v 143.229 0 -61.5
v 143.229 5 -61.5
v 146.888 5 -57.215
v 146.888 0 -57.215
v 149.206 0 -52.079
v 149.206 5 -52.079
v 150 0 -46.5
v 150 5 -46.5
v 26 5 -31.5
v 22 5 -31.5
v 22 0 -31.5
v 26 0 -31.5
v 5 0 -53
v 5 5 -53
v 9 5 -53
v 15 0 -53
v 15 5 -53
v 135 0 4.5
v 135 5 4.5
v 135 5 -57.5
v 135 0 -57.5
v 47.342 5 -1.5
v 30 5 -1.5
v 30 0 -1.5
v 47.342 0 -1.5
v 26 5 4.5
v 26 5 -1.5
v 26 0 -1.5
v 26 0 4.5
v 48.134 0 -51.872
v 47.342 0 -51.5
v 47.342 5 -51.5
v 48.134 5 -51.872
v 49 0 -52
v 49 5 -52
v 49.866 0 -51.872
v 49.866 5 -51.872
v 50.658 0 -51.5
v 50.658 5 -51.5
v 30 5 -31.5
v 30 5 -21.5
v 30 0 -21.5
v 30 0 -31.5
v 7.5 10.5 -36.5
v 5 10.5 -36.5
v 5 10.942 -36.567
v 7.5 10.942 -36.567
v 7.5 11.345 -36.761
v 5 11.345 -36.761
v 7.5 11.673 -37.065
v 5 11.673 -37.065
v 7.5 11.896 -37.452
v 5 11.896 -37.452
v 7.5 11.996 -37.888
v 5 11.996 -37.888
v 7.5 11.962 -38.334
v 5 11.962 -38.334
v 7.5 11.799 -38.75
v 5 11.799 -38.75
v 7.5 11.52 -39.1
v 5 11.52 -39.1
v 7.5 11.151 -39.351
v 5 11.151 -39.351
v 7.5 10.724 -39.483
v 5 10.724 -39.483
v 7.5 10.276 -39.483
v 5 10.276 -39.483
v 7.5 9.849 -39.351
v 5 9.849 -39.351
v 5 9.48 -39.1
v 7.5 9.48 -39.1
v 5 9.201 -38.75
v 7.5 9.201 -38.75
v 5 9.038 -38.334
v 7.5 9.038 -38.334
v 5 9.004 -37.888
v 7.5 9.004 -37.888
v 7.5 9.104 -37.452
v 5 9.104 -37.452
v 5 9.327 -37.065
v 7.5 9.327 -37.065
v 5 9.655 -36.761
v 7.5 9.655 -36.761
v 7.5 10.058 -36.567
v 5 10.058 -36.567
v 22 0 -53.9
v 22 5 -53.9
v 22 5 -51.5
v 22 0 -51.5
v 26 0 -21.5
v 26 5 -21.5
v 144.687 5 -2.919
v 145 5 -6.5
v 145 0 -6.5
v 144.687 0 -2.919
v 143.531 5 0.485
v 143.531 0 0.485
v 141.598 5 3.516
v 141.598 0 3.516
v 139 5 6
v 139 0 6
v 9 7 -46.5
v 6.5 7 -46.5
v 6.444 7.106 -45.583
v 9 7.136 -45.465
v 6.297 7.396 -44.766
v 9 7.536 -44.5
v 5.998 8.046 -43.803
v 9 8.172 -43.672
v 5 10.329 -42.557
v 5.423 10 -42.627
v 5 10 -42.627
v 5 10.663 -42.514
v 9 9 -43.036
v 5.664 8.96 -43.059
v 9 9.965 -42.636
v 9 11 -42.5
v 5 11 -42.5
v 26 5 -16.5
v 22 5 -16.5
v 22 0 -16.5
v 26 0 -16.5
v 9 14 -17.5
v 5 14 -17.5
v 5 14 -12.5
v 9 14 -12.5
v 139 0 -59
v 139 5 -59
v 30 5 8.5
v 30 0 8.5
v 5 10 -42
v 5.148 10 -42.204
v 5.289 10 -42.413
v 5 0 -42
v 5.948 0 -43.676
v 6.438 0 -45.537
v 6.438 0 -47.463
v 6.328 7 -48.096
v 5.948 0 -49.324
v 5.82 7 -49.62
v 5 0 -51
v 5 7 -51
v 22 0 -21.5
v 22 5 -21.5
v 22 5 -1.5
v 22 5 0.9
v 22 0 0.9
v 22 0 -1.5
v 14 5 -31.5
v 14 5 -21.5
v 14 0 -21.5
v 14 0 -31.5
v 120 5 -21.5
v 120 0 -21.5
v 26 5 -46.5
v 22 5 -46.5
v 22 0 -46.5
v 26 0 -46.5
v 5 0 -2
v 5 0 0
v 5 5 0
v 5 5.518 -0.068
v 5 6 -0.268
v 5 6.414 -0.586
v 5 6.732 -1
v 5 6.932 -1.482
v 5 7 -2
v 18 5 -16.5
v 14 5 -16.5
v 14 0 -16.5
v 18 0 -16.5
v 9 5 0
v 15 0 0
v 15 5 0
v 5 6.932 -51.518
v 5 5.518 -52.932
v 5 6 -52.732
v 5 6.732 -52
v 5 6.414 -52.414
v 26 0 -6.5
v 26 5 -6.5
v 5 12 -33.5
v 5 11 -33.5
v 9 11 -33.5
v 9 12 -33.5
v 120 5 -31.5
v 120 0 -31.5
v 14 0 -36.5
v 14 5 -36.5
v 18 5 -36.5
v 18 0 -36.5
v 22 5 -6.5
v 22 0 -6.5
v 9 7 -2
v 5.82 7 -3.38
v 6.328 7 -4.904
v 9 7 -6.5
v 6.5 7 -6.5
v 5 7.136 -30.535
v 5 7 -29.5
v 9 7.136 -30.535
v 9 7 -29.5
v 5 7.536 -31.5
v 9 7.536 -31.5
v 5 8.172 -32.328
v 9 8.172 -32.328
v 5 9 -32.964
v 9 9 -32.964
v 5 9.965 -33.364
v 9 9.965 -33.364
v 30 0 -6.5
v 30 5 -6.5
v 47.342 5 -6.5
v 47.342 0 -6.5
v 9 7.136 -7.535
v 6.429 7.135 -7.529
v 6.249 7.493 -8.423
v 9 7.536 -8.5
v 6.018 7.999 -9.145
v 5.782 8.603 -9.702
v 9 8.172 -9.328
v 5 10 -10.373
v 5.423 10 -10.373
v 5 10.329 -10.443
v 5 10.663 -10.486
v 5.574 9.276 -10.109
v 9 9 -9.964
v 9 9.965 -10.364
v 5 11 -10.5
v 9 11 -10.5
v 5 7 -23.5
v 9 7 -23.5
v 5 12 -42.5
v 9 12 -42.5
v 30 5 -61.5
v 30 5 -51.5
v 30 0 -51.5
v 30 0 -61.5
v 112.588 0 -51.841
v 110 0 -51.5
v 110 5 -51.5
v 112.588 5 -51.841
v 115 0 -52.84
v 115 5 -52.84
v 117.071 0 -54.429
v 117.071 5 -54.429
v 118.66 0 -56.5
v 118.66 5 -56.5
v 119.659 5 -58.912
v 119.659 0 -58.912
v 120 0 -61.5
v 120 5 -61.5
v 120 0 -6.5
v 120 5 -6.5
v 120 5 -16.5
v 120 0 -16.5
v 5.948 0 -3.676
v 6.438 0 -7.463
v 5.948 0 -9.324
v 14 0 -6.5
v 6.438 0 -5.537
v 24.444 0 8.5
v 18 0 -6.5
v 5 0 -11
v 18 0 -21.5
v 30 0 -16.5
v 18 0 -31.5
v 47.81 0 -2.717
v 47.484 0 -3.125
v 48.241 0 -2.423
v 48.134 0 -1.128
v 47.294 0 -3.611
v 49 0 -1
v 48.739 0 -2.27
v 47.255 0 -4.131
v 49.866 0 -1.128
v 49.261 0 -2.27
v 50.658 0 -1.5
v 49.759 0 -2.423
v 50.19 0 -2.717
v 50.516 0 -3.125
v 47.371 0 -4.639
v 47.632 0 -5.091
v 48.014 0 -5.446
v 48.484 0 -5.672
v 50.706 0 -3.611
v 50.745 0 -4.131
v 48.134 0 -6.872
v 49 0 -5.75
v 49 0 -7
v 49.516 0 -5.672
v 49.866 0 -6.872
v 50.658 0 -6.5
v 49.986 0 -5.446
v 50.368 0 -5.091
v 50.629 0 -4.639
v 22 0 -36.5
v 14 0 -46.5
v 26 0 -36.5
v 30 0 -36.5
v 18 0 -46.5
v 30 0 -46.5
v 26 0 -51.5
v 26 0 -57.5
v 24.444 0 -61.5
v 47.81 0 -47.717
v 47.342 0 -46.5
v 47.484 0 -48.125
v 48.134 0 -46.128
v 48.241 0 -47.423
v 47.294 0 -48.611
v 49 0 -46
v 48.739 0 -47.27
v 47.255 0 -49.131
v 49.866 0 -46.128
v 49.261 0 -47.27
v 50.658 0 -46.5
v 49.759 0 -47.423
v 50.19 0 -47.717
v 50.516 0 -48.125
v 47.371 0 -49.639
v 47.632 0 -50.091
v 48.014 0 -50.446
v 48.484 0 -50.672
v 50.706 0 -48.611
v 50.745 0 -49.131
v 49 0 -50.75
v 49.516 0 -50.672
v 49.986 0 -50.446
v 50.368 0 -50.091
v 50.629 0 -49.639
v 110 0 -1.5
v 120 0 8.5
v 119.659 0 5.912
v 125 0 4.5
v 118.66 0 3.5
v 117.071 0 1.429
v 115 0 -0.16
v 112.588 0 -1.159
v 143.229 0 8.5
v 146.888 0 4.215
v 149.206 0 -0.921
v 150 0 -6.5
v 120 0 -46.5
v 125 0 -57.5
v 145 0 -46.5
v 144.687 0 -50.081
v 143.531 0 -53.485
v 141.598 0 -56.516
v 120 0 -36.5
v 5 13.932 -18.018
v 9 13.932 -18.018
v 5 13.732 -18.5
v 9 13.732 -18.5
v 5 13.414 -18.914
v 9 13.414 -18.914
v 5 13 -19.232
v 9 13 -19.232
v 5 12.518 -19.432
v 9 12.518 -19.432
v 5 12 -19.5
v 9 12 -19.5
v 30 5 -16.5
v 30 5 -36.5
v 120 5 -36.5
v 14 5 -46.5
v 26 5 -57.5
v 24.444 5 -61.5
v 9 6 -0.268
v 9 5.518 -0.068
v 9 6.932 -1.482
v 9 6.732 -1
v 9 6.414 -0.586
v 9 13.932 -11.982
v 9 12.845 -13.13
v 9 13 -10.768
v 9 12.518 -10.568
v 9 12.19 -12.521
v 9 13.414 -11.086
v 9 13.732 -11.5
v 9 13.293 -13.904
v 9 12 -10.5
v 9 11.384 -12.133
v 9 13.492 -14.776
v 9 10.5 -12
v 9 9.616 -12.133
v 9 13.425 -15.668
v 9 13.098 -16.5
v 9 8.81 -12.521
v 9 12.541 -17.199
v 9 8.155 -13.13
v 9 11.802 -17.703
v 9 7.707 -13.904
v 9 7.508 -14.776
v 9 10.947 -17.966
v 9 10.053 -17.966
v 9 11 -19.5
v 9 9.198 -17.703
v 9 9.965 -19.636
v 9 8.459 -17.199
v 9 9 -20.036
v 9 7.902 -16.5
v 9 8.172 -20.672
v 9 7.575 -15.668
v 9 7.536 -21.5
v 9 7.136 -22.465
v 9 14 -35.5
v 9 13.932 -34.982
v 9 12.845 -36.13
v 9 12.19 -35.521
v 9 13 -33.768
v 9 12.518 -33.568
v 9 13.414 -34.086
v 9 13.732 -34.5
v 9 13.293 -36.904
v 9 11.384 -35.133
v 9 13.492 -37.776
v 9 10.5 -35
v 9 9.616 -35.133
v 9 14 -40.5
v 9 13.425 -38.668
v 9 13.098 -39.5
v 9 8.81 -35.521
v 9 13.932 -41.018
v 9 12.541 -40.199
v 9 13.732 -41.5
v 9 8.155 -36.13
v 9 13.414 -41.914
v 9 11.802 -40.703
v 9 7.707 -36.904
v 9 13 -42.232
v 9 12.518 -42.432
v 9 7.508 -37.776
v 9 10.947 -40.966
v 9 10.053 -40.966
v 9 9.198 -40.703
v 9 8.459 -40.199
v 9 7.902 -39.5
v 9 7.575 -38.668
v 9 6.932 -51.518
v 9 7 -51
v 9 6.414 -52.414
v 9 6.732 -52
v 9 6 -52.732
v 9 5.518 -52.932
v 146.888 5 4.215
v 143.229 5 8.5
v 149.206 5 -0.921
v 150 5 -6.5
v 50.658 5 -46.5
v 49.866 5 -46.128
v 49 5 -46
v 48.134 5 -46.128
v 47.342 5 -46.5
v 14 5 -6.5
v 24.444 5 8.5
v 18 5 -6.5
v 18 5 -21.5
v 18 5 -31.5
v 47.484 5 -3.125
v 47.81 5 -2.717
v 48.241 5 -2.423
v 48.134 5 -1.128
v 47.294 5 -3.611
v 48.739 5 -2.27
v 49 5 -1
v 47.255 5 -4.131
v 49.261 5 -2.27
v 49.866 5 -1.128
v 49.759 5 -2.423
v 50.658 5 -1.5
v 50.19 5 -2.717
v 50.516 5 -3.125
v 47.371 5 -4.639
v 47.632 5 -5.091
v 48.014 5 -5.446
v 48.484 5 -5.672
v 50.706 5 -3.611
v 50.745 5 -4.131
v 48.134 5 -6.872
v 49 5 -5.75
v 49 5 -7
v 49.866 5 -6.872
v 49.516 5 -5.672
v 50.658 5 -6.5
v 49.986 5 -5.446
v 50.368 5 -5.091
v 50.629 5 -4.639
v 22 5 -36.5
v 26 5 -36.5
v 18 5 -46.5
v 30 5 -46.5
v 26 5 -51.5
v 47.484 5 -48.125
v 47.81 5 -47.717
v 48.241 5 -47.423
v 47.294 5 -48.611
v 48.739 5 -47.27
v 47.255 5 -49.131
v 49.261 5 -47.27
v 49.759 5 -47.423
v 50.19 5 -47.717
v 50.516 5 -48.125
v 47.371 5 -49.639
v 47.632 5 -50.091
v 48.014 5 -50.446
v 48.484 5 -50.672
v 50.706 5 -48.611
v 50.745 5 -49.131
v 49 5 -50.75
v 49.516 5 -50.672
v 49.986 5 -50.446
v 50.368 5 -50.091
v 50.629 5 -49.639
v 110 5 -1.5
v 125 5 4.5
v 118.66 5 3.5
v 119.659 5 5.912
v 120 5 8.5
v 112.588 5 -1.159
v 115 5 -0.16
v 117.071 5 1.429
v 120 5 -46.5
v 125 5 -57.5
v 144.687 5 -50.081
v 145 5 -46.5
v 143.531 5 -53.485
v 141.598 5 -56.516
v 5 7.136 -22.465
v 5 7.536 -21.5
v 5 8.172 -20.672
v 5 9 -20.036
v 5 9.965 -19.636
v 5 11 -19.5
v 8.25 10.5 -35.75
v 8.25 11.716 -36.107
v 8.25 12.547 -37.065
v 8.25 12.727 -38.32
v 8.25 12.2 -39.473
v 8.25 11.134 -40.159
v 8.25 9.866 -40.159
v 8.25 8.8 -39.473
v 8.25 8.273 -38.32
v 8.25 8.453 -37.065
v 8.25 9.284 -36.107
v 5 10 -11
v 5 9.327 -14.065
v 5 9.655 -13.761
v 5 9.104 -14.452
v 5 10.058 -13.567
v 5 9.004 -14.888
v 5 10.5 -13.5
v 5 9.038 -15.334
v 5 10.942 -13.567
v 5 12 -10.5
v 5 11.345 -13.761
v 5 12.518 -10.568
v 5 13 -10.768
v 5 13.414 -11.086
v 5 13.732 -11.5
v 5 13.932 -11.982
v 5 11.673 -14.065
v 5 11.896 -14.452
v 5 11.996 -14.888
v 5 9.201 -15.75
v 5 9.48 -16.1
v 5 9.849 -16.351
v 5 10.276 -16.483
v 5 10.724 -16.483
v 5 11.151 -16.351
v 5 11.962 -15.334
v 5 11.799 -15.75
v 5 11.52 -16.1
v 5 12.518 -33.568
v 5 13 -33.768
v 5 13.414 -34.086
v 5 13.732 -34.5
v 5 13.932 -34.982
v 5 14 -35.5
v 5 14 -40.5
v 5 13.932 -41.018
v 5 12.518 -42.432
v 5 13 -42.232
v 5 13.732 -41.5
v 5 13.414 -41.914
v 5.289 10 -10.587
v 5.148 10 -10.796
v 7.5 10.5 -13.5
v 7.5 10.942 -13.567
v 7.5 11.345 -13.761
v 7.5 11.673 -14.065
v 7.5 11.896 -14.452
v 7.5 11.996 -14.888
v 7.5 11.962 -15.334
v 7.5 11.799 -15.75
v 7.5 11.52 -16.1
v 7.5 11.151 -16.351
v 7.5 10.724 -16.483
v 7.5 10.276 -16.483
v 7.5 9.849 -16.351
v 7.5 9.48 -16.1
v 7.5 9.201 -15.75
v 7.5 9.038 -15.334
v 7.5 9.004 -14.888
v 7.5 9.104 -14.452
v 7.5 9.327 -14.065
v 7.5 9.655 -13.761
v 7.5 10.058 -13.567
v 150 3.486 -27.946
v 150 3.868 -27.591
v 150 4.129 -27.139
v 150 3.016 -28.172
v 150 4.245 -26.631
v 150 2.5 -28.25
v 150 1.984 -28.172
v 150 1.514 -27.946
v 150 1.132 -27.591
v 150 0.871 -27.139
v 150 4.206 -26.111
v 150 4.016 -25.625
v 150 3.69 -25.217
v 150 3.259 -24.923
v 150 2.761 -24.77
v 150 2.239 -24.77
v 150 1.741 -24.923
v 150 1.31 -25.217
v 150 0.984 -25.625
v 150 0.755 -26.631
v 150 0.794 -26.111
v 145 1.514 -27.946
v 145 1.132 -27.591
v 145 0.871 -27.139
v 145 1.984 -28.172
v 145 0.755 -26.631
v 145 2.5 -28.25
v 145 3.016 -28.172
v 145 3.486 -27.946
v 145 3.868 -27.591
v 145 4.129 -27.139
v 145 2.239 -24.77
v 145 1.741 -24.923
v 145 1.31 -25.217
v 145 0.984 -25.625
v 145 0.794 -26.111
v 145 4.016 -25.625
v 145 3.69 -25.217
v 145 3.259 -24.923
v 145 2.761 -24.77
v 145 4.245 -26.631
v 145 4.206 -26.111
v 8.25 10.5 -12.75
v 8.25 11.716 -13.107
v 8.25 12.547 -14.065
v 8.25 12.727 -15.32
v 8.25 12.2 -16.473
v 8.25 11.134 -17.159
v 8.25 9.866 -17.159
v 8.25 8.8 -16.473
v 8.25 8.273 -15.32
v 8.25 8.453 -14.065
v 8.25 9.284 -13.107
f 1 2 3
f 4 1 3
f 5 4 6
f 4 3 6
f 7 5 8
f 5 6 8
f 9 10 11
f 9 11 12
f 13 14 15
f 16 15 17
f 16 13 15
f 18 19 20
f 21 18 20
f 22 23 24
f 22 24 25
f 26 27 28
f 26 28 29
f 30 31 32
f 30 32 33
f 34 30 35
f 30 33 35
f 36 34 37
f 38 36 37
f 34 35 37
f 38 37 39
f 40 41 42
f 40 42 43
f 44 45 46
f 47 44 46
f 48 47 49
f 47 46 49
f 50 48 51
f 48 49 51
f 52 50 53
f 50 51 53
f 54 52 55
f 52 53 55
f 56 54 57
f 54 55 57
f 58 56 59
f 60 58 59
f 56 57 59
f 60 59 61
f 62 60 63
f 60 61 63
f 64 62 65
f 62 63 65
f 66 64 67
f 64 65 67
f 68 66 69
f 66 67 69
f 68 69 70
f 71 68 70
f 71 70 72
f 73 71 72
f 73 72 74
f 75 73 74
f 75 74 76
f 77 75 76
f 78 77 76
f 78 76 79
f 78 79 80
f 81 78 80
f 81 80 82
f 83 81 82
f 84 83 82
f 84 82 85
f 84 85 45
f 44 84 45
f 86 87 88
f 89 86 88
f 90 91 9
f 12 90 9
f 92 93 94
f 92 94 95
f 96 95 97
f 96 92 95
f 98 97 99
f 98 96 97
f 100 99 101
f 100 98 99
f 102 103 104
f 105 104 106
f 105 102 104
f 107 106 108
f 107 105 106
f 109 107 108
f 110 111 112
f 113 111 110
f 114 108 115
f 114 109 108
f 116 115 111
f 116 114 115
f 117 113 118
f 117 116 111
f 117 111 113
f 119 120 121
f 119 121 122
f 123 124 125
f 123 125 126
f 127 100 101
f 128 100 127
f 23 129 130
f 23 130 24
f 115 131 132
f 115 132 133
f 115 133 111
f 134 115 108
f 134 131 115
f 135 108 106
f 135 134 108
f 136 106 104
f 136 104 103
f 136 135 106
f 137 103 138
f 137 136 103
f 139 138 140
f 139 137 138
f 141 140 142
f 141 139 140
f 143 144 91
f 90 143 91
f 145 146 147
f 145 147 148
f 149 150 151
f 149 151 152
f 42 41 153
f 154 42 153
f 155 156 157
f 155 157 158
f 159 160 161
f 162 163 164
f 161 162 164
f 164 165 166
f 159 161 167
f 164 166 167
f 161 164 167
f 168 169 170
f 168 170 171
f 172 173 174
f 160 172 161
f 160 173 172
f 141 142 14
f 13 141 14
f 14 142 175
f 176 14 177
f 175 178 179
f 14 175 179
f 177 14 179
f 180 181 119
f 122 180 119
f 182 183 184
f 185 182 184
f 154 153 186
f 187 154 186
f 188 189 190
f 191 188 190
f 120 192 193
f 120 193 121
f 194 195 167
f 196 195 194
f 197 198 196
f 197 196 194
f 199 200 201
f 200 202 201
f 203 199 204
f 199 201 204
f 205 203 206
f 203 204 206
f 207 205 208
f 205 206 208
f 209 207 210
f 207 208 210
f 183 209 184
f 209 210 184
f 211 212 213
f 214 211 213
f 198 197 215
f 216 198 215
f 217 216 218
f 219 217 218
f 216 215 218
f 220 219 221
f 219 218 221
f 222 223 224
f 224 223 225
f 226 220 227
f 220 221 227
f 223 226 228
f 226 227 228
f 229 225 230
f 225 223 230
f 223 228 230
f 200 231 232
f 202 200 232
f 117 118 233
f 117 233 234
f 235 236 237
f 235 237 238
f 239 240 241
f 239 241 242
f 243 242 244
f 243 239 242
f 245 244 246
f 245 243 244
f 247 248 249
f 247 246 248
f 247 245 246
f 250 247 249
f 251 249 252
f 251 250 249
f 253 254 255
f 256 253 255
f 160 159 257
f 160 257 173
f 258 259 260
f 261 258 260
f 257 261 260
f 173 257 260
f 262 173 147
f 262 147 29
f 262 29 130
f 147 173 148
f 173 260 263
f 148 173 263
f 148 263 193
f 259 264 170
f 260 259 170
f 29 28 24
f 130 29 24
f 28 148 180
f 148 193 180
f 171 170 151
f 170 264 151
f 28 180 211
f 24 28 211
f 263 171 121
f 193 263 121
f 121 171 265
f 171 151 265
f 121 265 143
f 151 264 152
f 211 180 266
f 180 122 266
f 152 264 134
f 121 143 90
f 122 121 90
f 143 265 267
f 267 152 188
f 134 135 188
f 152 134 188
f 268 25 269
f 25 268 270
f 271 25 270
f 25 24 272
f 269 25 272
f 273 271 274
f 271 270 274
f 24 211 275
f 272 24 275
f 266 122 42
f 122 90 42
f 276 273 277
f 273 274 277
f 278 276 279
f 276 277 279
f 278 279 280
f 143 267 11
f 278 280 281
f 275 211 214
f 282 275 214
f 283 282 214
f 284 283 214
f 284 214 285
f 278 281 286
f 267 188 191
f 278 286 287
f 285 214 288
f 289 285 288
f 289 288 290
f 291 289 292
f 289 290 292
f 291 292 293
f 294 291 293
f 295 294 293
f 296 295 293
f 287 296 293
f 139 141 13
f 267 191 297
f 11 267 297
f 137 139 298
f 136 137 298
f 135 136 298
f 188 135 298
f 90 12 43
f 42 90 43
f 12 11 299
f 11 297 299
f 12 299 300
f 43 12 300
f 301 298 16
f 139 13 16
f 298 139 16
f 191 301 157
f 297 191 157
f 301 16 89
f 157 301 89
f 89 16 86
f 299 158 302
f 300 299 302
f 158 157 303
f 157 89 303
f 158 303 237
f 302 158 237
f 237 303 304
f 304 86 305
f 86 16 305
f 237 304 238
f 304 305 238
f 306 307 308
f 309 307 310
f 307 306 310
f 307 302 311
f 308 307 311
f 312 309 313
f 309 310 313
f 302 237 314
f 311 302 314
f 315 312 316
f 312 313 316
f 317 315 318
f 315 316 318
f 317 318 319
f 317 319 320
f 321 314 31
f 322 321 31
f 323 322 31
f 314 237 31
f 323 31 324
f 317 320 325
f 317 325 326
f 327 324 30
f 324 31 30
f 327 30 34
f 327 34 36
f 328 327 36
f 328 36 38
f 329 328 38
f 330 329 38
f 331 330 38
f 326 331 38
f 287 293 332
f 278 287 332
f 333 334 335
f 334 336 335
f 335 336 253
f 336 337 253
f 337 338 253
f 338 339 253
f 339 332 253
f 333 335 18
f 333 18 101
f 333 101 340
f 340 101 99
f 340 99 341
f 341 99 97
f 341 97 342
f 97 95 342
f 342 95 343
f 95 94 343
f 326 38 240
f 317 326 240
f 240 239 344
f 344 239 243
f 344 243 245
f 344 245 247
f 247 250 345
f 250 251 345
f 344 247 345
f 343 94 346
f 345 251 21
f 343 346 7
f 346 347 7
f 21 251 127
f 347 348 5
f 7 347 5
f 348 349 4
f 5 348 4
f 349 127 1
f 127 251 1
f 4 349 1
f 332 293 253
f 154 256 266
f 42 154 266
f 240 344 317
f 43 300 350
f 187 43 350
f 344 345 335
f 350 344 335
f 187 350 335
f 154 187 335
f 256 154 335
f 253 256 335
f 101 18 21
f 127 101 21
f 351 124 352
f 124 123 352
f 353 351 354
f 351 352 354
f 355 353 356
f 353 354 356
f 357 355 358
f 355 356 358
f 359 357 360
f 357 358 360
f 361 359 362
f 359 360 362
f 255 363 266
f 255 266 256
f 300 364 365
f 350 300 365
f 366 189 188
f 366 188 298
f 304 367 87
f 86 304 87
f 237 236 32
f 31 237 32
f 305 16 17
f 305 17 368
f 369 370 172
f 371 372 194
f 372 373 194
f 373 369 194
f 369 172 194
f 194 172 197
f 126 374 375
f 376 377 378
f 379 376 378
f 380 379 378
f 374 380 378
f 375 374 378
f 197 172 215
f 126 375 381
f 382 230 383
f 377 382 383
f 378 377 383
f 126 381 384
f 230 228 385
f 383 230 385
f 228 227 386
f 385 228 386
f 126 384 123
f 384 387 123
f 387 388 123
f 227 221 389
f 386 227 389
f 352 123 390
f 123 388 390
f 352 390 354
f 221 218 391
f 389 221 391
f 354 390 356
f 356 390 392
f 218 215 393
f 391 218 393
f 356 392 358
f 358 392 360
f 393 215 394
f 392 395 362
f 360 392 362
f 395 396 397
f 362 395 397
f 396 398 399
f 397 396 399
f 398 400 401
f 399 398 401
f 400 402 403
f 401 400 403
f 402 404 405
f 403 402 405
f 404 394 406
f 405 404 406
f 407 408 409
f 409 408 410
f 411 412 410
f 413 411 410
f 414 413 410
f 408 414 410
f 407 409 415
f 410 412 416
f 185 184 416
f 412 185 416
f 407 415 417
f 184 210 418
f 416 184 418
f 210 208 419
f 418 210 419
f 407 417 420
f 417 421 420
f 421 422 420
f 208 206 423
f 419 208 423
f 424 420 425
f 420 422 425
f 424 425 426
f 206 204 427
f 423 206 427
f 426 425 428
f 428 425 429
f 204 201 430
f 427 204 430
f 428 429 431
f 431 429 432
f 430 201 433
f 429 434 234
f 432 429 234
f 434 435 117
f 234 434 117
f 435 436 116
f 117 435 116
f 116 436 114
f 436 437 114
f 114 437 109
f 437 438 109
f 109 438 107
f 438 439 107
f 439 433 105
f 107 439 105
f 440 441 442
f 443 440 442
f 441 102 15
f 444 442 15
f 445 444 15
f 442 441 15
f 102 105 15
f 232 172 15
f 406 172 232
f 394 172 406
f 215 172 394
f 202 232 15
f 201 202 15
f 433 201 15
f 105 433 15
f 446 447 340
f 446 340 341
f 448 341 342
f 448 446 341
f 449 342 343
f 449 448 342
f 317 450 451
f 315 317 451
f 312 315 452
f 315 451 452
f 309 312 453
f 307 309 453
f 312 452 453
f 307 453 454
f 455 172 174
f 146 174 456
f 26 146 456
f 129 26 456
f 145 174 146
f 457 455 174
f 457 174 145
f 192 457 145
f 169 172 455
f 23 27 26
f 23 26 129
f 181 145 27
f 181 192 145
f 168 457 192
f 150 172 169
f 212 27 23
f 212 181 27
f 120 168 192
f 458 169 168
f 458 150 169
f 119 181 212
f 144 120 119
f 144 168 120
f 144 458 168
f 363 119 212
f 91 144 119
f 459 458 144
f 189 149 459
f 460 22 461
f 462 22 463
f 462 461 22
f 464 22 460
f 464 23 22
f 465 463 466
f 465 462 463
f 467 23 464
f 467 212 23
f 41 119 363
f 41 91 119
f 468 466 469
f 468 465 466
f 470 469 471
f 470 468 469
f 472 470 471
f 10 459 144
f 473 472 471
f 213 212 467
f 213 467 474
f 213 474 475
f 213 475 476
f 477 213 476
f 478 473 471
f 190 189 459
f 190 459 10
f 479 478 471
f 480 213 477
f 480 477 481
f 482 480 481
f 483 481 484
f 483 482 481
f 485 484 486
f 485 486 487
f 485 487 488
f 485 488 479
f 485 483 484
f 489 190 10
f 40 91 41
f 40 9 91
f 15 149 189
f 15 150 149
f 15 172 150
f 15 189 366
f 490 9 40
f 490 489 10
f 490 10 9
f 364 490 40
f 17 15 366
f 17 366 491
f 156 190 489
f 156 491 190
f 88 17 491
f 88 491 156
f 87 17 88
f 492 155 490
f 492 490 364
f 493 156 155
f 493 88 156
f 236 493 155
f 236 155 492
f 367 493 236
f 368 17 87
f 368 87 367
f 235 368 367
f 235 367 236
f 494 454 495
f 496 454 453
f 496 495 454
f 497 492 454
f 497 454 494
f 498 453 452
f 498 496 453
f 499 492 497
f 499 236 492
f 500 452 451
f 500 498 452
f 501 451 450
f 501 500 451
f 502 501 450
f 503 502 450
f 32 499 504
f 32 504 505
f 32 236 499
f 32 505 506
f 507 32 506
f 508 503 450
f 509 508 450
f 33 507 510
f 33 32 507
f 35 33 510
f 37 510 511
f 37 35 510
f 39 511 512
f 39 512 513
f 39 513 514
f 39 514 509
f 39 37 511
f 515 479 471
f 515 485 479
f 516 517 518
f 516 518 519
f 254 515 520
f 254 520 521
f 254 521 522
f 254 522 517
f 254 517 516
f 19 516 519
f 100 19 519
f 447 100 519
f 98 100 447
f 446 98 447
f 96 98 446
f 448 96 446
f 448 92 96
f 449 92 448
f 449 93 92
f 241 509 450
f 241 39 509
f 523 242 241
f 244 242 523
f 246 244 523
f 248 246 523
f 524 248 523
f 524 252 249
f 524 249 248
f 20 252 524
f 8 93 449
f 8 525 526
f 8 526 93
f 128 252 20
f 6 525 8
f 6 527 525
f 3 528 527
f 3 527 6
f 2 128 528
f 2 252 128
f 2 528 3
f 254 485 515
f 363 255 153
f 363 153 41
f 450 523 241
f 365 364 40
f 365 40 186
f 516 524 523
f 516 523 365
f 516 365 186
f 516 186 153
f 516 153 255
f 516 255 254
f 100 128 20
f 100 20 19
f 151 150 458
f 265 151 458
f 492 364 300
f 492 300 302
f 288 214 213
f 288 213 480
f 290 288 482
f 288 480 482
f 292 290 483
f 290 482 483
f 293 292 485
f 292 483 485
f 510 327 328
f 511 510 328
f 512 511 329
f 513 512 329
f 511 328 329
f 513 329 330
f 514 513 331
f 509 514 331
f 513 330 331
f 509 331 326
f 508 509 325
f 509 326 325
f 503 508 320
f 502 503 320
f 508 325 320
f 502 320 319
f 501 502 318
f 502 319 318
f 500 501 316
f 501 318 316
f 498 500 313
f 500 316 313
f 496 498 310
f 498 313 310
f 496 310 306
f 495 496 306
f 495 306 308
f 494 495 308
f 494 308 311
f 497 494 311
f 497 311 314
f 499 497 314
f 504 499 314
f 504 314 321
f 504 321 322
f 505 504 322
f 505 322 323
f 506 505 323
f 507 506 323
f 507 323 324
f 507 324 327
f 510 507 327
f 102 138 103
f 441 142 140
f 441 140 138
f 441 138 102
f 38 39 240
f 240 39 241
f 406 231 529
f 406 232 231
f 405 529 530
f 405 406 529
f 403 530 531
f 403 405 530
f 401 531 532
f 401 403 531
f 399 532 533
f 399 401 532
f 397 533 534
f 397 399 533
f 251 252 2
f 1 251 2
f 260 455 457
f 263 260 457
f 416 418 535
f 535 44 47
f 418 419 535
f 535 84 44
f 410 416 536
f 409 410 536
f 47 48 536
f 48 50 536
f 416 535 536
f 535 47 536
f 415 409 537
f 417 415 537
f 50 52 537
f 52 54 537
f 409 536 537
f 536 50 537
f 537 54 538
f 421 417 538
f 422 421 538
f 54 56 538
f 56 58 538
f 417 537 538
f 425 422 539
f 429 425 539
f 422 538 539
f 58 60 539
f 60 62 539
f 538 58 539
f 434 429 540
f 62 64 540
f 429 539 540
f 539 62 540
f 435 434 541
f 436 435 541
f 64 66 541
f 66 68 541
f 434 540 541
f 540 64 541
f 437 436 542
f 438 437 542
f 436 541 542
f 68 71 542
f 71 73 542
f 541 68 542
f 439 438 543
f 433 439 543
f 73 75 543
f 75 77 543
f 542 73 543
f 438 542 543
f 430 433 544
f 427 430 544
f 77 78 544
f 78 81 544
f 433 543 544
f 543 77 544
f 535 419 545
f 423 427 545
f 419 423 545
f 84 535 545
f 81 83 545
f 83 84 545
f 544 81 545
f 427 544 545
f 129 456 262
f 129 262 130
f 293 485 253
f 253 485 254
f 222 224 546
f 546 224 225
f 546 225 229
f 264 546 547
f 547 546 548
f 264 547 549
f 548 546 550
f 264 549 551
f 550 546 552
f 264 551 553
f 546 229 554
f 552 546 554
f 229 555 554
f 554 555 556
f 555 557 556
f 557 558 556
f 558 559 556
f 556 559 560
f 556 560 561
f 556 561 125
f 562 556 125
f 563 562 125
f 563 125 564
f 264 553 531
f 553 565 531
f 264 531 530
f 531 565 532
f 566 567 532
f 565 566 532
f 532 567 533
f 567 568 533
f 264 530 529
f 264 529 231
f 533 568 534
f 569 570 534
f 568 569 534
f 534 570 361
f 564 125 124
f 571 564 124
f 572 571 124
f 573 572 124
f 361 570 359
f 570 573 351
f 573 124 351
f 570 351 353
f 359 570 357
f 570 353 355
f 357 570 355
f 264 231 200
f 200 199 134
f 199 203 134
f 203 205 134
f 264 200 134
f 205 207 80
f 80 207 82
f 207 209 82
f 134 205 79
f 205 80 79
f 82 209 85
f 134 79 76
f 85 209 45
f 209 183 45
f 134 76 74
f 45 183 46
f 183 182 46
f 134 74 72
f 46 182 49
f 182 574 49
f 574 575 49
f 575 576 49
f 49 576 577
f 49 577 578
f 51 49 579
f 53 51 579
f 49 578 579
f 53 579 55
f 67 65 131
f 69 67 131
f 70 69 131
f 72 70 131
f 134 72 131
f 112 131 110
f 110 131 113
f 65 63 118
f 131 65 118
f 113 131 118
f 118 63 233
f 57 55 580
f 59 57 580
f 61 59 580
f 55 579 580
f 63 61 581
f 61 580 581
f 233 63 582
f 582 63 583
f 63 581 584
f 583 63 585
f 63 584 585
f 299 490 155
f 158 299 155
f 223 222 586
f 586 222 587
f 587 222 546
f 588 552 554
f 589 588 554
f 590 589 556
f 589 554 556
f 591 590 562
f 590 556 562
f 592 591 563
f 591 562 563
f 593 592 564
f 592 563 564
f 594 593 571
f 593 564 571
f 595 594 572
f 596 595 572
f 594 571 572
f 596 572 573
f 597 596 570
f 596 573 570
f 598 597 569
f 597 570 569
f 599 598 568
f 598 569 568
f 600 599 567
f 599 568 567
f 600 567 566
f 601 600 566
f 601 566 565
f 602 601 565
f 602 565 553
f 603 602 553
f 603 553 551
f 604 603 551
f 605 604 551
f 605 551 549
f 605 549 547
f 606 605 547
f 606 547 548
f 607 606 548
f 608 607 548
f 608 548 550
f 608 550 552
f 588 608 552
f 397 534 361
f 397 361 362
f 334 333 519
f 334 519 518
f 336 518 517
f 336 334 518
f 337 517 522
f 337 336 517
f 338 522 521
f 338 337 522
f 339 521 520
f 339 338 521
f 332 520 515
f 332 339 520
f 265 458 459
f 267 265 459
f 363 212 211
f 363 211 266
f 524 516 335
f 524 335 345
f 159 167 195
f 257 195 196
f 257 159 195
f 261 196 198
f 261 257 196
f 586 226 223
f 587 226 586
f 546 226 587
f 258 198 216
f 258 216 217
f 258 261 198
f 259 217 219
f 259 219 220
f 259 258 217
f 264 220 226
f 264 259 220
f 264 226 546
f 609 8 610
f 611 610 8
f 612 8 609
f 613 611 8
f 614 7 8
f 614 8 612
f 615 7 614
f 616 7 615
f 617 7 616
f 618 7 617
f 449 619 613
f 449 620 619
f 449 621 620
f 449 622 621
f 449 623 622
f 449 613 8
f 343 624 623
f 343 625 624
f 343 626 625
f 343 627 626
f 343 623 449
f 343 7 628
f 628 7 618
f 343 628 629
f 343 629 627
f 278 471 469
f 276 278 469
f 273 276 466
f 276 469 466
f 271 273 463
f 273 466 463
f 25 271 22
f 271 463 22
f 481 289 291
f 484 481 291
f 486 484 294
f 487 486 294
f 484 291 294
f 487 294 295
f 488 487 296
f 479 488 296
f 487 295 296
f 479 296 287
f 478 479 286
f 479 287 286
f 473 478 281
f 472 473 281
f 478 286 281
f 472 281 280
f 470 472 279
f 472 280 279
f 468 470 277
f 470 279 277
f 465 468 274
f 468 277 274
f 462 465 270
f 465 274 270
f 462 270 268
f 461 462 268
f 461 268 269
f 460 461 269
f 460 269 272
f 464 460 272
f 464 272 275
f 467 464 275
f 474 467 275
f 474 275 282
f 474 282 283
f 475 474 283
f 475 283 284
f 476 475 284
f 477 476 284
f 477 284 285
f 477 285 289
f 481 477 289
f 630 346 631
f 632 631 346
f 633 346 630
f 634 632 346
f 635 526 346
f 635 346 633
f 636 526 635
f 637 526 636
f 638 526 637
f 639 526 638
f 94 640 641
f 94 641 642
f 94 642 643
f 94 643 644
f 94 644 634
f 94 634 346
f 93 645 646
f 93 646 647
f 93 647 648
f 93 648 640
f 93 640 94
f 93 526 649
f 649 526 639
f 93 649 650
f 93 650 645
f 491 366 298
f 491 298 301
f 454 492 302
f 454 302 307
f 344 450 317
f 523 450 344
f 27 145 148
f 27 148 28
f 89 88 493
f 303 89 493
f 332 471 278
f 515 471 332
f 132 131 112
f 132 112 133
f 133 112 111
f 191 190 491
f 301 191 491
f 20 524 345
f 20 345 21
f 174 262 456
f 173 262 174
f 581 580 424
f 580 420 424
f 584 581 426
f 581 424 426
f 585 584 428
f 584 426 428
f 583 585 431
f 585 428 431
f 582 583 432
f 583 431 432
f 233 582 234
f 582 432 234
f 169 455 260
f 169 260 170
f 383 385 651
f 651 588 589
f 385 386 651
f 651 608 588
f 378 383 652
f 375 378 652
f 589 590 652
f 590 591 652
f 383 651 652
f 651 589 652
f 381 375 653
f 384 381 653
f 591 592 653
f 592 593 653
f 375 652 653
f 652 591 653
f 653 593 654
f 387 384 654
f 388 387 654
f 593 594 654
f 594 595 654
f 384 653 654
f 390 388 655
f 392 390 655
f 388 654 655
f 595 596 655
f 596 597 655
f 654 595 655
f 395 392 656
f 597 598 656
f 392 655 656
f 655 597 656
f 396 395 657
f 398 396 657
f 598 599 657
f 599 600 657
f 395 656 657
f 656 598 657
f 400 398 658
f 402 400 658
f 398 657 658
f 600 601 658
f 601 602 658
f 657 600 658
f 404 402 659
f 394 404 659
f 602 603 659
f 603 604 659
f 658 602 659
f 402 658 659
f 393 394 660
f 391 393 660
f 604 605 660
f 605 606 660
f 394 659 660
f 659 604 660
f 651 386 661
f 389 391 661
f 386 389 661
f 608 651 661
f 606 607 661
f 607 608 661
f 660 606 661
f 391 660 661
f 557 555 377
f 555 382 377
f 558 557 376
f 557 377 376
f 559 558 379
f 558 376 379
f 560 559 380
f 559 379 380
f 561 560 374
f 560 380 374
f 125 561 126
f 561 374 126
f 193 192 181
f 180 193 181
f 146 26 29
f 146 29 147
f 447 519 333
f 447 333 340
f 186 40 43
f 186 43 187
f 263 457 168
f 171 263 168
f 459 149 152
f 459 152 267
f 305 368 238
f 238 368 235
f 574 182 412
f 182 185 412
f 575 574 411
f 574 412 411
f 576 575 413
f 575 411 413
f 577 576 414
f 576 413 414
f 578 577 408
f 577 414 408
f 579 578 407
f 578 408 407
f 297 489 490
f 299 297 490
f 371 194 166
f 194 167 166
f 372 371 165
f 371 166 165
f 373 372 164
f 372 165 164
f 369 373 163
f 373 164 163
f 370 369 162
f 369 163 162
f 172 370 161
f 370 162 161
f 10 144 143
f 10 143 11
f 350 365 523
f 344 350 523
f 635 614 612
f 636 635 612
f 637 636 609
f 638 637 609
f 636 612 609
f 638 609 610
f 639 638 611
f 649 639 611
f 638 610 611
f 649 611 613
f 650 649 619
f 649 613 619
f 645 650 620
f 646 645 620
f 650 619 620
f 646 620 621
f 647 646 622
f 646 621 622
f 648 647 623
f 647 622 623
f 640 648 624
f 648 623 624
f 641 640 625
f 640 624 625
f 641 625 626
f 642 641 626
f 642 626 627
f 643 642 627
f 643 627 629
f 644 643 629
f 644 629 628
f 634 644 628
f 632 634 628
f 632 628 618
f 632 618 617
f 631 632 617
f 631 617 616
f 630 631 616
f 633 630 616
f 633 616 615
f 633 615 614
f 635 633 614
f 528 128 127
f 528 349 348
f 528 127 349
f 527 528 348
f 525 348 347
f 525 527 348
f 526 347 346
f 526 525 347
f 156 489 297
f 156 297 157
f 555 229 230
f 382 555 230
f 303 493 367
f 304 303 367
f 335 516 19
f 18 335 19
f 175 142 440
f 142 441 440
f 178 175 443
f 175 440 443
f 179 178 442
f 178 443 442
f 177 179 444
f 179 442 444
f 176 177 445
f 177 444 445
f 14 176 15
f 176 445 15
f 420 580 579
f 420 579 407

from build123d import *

# Parameters (mm, degrees)
Y_KSEKLIK_EKSTR_ZYON1_DEPTH = 7
IZIM2_R                     = 1.5
KES_EKSTR_ZYON1_DEPTH       = 7
PAH1_SIZE                   = 2.5
IZIM3_R                     = 2
KES_EKSTR_ZYON2_DEPTH       = 10
KES_EKSTR_ZYON3_START       = -10
IZIM4_R                     = 2
KES_EKSTR_ZYON3_DEPTH       = 10
RADYUS1_R                   = 20
IZIM5_W                     = 90
IZIM5_H                     = 10
IZIM5_W_2                   = 10
IZIM5_H_2                   = 70
KES_EKSTR_ZYON4_DEPTH       = 10
RADYUS2_R                   = 4
KES_EKSTR_ZYON5_DEPTH       = 10
IZIM8_W                     = 5
IZIM8_H                     = 53
KES_EKSTR_ZYON6_DEPTH       = 10
IZIM9_W                     = 8.724341423
IZIM9_H                     = 2.178581573
IZIM9_W_2                   = 9.164333206
Y_KSEKLIK_EKSTR_ZYON2_DEPTH = 10
IZIM10_W                    = 140
IZIM10_H                    = 10
KES_EKSTR_ZYON7_DEPTH       = 10
IZIM11_W                    = 10
IZIM11_H                    = 4
Y_KSEKLIK_EKSTR_ZYON3_DEPTH = 7
RADYUS3_R                   = 10
IZIM12_W                    = 4
IZIM12_H                    = 9
Y_KSEKLIK_EKSTR_ZYON4_DEPTH = 7
RADYUS4_R                   = 4
IZIM13_R                    = 1.5
KES_EKSTR_ZYON8_DEPTH       = 7
PAH2_SIZE                   = 1.5
RADYUS5_R                   = 2
IZIM14_W                    = 144.535934645
IZIM14_H                    = 70
KES_EKSTR_ZYON9_DEPTH       = 2
RADYUS6_R                   = 2
KES_EKSTR_ZYON10_DEPTH      = 5
KES_EKSTR_ZYON10_DEPTH_BACK = 5
IZIM15_R                    = 7.5
IZIM16_R                    = 1.75
KES_EKSTR_ZYON11_DEPTH      = 7
IZIM17_R                    = 1.75
KES_EKSTR_ZYON12_DEPTH      = 10
Y_KSEKLIK_EKSTR_ZYON5_START = -5
IZIM18_R                    = 3
IZIM18_R_2                  = 2
Y_KSEKLIK_EKSTR_ZYON5_DEPTH = 5
IZIM19_W                    = 4
IZIM19_H                    = 10
KES_EKSTR_ZYON13_DEPTH      = 10


# Some blends are built 0.0001 mm under size
with BuildPart() as part:
    # Çizim1 → Yükseklik-Ekstrüzyon1 (new body)
    with BuildSketch(Plane(origin=(0, 0, 0), x_dir=(1, 0, 0), z_dir=(0, 1, 0))):
        Polygon((0, 0), (0, 53), (15, 53), (30, 66.5), (150, 66.5), (150, -13.5), (30, -13.5), (15, 0), align=None)
    extrude(amount=Y_KSEKLIK_EKSTR_ZYON1_DEPTH)

    # Çizim2 → Kes-Ekstrüzyon1 (cut)
    with BuildSketch(Plane(origin=(0, 7, 0), x_dir=(1, 0, 0), z_dir=(0, 1, 0))):
        with Locations(Location((2.5, 41.25, 0), (0, 0, 270))):
            Circle(IZIM2_R)
        with Locations(Location((2.5, 11.75, 0), (0, 0, 270))):
            Circle(IZIM2_R)
    extrude(amount=-KES_EKSTR_ZYON1_DEPTH, mode=Mode.SUBTRACT)

    # Pah1
    # the kernel refuses this chamfer: 2.5 mm, written as the material it takes off along each edge
    with BuildSketch(Plane(origin=(2.5, 7, -41.25), x_dir=(0, 0, 1), z_dir=(-1, 0, 0))) as pah1_piece_1:
        Polygon((1.5 + PAH1_SIZE, 0), (1.5, -PAH1_SIZE), (1.5, 0), align=None)
    revolve(axis=Axis((2.5, 7, -41.25), (0, 1, 0)), mode=Mode.SUBTRACT)
    with BuildSketch(Plane(origin=(2.5, 7, -11.75), x_dir=(0, 0, 1), z_dir=(-1, 0, 0))) as pah1_piece_2:
        Polygon((1.5 + PAH1_SIZE, 0), (1.5, -PAH1_SIZE), (1.5, 0), align=None)
    revolve(axis=Axis((2.5, 7, -11.75), (0, 1, 0)), mode=Mode.SUBTRACT)

    # Çizim3 → Kes-Ekstrüzyon2 (cut)
    with BuildSketch(Plane.XY.offset(13.5)):
        with Locations((46.24, 3.5)):
            Circle(IZIM3_R)
    extrude(amount=-KES_EKSTR_ZYON2_DEPTH, mode=Mode.SUBTRACT)

    # Çizim4 → Kes-Ekstrüzyon3 (cut)
    with BuildSketch(Plane(origin=(0, 0, -66.5), x_dir=(-1, 0, 0), z_dir=(0, 0, -1)).offset(KES_EKSTR_ZYON3_START)):
        with Locations(Location((-46.24, 3.5, 0), (0, 0, 180))):
            Circle(IZIM4_R)
    extrude(amount=KES_EKSTR_ZYON3_DEPTH, mode=Mode.SUBTRACT)

    # Radyus1
    radyus1_edges = [part.edges().sort_by_distance(p)[0] for p in [
        (150, 3.5, -66.5),
        (150, 3.5, 13.5),
    ]]
    fillet(radyus1_edges, radius=RADYUS1_R)

    # Çizim5 → Kes-Ekstrüzyon4 (cut)
    with BuildSketch(Plane(origin=(0, 7, 0), x_dir=(1, 0, 0), z_dir=(0, 1, 0))):
        with Locations((75, -3.5)):
            Rectangle(IZIM5_W, IZIM5_H)
        with Locations((75, 26.5)):
            Rectangle(IZIM5_W, IZIM5_H)
        with Locations((75, 41.5)):
            Rectangle(IZIM5_W, IZIM5_H)
        with Locations((75, 56.5)):
            Rectangle(IZIM5_W, IZIM5_H)
        with Locations((75, 11.5)):
            Rectangle(IZIM5_W, IZIM5_H)
        with Locations((130, 26.5)):
            Rectangle(IZIM5_W_2, IZIM5_H_2)
    extrude(amount=-KES_EKSTR_ZYON4_DEPTH, mode=Mode.SUBTRACT)

    # Radyus2
    radyus2_edges = [part.edges().sort_by_distance(p)[0] for p in [
        (135, 3.5, -61.5),
        (135, 3.5, 8.5),
    ]]
    fillet(radyus2_edges, radius=RADYUS2_R)

    # Çizim6 → Kes-Ekstrüzyon5 (cut)
    with BuildSketch(Plane(origin=(0, 7, 0), x_dir=(1, 0, 0), z_dir=(0, 1, 0))):
        with BuildLine():
            Line((139, -6), (139, 59))
            ThreePointArc((139, 59), (143.530979443, 53.484870133), (145, 46.5))
            Line((145, 46.5), (145, 6.5))
            ThreePointArc((145, 6.5), (143.530979443, -0.484870133), (139, -6))
        make_face()
    extrude(amount=-KES_EKSTR_ZYON5_DEPTH, mode=Mode.SUBTRACT)

    # Çizim8 → Kes-Ekstrüzyon6 (cut)
    with BuildSketch(Plane(origin=(0, 7, 0), x_dir=(1, 0, 0), z_dir=(0, 1, 0))):
        with Locations((2.5, 26.5)):
            Rectangle(IZIM8_W, IZIM8_H)
    extrude(amount=-KES_EKSTR_ZYON6_DEPTH, mode=Mode.SUBTRACT)

    # Çizim9 → Yükseklik-Ekstrüzyon2 (add)
    with BuildSketch(Plane.ZY.offset(-5)):
        with Locations((-12.430411948, 5.910709214)):
            Rectangle(IZIM9_W, IZIM9_H)
        with Locations((-41.247168871, 5.910709214)):
            Rectangle(IZIM9_W_2, IZIM9_H)
    extrude(amount=-Y_KSEKLIK_EKSTR_ZYON2_DEPTH)

    # Çizim10 → Kes-Ekstrüzyon7 (cut)
    with BuildSketch(Plane(origin=(0, 7, 0), x_dir=(1, 0, 0), z_dir=(0, 1, 0))):
        with Locations((85, -13.5)):
            Rectangle(IZIM10_W, IZIM10_H)
        with Locations((85, 66.5)):
            Rectangle(IZIM10_W, IZIM10_H)
    extrude(amount=-KES_EKSTR_ZYON7_DEPTH, mode=Mode.SUBTRACT)


with BuildPart() as kes_ekstr_zyon7_piece_1:
    # of the separate pieces the step leaves, piece 1, a body of its own (kes_ekstr_zyon7_pieces)
    add(part.part.solids().sort_by_distance((24.444444444, 0, 8.5))[0])



with BuildPart() as kes_ekstr_zyon7_piece_2:
    # of the separate pieces the step leaves, piece 2, a body of its own (kes_ekstr_zyon7_pieces)
    add(part.part.solids().sort_by_distance((143.228756555, 0, 8.5))[0])


with BuildPart() as kes_ekstr_zyon7_piece_1_1:
    add(kes_ekstr_zyon7_piece_1.part)

    add(kes_ekstr_zyon7_piece_2.part)  # Yükseklik-Ekstrüzyon3 merges Kes-Ekstrüzyon7 piece 2
    # Çizim11 → Yükseklik-Ekstrüzyon3 (add)
    with BuildSketch(Plane(origin=(0, 7, 0), x_dir=(1, 0, 0), z_dir=(0, 1, 0))):
        with Locations((130, -6.5)):
            Rectangle(IZIM11_W, IZIM11_H)
        with Locations((130, 59.5)):
            Rectangle(IZIM11_W, IZIM11_H)
    extrude(amount=-Y_KSEKLIK_EKSTR_ZYON3_DEPTH)

    # Radyus3
    radyus3_edges = [kes_ekstr_zyon7_piece_1_1.edges().sort_by_distance(p)[0] for p in [
        (120, 3.5, -1.5),
        (120, 3.5, -51.5),
    ]]
    fillet(radyus3_edges, radius=RADYUS3_R - 0.0001)  # a hair under: the kernel refuses the full size

    # Çizim12 → Yükseklik-Ekstrüzyon4 (add)
    with BuildSketch(Plane(origin=(0, 7, 0), x_dir=(1, 0, 0), z_dir=(0, 1, 0))):
        with Locations((7, 15)):
            Rectangle(IZIM12_W, IZIM12_H)
        with Locations((7, 38)):
            Rectangle(IZIM12_W, IZIM12_H)
    extrude(amount=Y_KSEKLIK_EKSTR_ZYON4_DEPTH)

    # Radyus4
    radyus4_edges = [kes_ekstr_zyon7_piece_1_1.edges().sort_by_distance(p)[0] for p in [
        (7, 7, -10.5),
        (7, 7, -19.5),
        (7, 7, -33.5),
        (7, 7, -42.5),
    ]]
    fillet(radyus4_edges, radius=RADYUS4_R)

    # Çizim13 → Kes-Ekstrüzyon8 (cut)
    with BuildSketch(Plane.ZY.offset(-5)):
        with Locations((-38, 10.5)):
            Circle(IZIM13_R)
        with Locations((-15, 10.5)):
            Circle(IZIM13_R)
    extrude(amount=-KES_EKSTR_ZYON8_DEPTH, mode=Mode.SUBTRACT)

    # Pah2
    pah2_edges = [kes_ekstr_zyon7_piece_1_1.edges().sort_by_distance(p)[0] for p in [
        (9, 10.5, -39.5),
        (9, 10.5, -16.5),
    ]]
    chamfer(pah2_edges, length=PAH2_SIZE)

    # Radyus5
    radyus5_edges = [kes_ekstr_zyon7_piece_1_1.edges().sort_by_distance(p)[0] for p in [
        (7, 14, -10.5),
        (7, 14, -19.5),
        (7, 14, -33.5),
        (7, 14, -42.5),
    ]]
    fillet(radyus5_edges, radius=RADYUS5_R)

    # Çizim14 → Kes-Ekstrüzyon9 (cut)
    with BuildSketch(Plane(origin=(0, 7, 0), x_dir=(1, 0, 0), z_dir=(0, 1, 0))):
        with Locations((81.267967322, 26.5)):
            Rectangle(IZIM14_W, IZIM14_H)
    extrude(amount=-KES_EKSTR_ZYON9_DEPTH, mode=Mode.SUBTRACT)

    # Radyus6
    radyus6_edges = [kes_ekstr_zyon7_piece_1_1.edges().sort_by_distance(p)[0] for p in [
        (7, 7, 0),
        (7, 7, -53),
    ]]
    fillet(radyus6_edges, radius=RADYUS6_R)

    # Çizim15 → Kes-Ekstrüzyon10 (cut, two sides: drawn at the far end of the back side and taken through both)
    with BuildSketch(Plane(origin=(0, 5, 0), x_dir=(1, 0, 0), z_dir=(0, 1, 0)).offset(-KES_EKSTR_ZYON10_DEPTH_BACK)):
        with Locations((-1, 46.5)):
            Circle(IZIM15_R)
        with Locations((-1, 6.5)):
            Circle(IZIM15_R)
    extrude(amount=KES_EKSTR_ZYON10_DEPTH + KES_EKSTR_ZYON10_DEPTH_BACK, mode=Mode.SUBTRACT)

    # Çizim16 → Kes-Ekstrüzyon11 (cut)
    with BuildSketch(Plane(origin=(150, 0, 0), x_dir=(0, 0, -1), z_dir=(1, 0, 0))):
        with Locations((26.5, 2.5)):
            Circle(IZIM16_R)
    extrude(amount=-KES_EKSTR_ZYON11_DEPTH, mode=Mode.SUBTRACT)

    # Çizim17 → Kes-Ekstrüzyon12 (cut)
    with BuildSketch(Plane.XZ):
        with Locations(Location((49, -4, 0), (0, 0, 270))):
            Circle(IZIM17_R)
        with Locations(Location((49, -49, 0), (0, 0, 270))):
            Circle(IZIM17_R)
    extrude(amount=-KES_EKSTR_ZYON12_DEPTH, mode=Mode.SUBTRACT)

    # Çizim18 → Yükseklik-Ekstrüzyon5 (add)
    # profile 1 of 2: a face of its own
    with BuildSketch(Plane.XZ.offset(Y_KSEKLIK_EKSTR_ZYON5_START)):
        with Locations((49, -4)):
            Circle(IZIM18_R)
        with Locations((49, -4)):
            Circle(IZIM18_R_2, mode=Mode.SUBTRACT)
    # profile 2 of 2: a face of its own
    with BuildSketch(Plane.XZ.offset(Y_KSEKLIK_EKSTR_ZYON5_START)):
        with Locations((49, -49)):
            Circle(IZIM18_R)
        with Locations((49, -49)):
            Circle(IZIM18_R_2, mode=Mode.SUBTRACT)
    extrude(amount=Y_KSEKLIK_EKSTR_ZYON5_DEPTH)

    # Çizim19 → Kes-Ekstrüzyon13 (cut)
    with BuildSketch(Plane(origin=(0, 5, 0), x_dir=(1, 0, 0), z_dir=(0, 1, 0))):
        Polygon((22, 51.5), (26, 51.5), (26, 57.5), (22, 53.9), align=None)
        with Locations((24, 41.5)):
            Rectangle(IZIM19_W, IZIM19_H)
        with Locations((24, 26.5)):
            Rectangle(IZIM19_W, IZIM19_H)
        with Locations((24, 11.5)):
            Rectangle(IZIM19_W, IZIM19_H)
        Polygon((22, 1.5), (26, 1.5), (26, -4.5), (22, -0.9), align=None)
        with Locations((16, 41.5)):
            Rectangle(IZIM19_W, IZIM19_H)
        with Locations((16, 26.5)):
            Rectangle(IZIM19_W, IZIM19_H)
        with Locations((16, 11.5)):
            Rectangle(IZIM19_W, IZIM19_H)
    extrude(amount=-KES_EKSTR_ZYON13_DEPTH, mode=Mode.SUBTRACT)


solid = kes_ekstr_zyon7_piece_1_1.part
